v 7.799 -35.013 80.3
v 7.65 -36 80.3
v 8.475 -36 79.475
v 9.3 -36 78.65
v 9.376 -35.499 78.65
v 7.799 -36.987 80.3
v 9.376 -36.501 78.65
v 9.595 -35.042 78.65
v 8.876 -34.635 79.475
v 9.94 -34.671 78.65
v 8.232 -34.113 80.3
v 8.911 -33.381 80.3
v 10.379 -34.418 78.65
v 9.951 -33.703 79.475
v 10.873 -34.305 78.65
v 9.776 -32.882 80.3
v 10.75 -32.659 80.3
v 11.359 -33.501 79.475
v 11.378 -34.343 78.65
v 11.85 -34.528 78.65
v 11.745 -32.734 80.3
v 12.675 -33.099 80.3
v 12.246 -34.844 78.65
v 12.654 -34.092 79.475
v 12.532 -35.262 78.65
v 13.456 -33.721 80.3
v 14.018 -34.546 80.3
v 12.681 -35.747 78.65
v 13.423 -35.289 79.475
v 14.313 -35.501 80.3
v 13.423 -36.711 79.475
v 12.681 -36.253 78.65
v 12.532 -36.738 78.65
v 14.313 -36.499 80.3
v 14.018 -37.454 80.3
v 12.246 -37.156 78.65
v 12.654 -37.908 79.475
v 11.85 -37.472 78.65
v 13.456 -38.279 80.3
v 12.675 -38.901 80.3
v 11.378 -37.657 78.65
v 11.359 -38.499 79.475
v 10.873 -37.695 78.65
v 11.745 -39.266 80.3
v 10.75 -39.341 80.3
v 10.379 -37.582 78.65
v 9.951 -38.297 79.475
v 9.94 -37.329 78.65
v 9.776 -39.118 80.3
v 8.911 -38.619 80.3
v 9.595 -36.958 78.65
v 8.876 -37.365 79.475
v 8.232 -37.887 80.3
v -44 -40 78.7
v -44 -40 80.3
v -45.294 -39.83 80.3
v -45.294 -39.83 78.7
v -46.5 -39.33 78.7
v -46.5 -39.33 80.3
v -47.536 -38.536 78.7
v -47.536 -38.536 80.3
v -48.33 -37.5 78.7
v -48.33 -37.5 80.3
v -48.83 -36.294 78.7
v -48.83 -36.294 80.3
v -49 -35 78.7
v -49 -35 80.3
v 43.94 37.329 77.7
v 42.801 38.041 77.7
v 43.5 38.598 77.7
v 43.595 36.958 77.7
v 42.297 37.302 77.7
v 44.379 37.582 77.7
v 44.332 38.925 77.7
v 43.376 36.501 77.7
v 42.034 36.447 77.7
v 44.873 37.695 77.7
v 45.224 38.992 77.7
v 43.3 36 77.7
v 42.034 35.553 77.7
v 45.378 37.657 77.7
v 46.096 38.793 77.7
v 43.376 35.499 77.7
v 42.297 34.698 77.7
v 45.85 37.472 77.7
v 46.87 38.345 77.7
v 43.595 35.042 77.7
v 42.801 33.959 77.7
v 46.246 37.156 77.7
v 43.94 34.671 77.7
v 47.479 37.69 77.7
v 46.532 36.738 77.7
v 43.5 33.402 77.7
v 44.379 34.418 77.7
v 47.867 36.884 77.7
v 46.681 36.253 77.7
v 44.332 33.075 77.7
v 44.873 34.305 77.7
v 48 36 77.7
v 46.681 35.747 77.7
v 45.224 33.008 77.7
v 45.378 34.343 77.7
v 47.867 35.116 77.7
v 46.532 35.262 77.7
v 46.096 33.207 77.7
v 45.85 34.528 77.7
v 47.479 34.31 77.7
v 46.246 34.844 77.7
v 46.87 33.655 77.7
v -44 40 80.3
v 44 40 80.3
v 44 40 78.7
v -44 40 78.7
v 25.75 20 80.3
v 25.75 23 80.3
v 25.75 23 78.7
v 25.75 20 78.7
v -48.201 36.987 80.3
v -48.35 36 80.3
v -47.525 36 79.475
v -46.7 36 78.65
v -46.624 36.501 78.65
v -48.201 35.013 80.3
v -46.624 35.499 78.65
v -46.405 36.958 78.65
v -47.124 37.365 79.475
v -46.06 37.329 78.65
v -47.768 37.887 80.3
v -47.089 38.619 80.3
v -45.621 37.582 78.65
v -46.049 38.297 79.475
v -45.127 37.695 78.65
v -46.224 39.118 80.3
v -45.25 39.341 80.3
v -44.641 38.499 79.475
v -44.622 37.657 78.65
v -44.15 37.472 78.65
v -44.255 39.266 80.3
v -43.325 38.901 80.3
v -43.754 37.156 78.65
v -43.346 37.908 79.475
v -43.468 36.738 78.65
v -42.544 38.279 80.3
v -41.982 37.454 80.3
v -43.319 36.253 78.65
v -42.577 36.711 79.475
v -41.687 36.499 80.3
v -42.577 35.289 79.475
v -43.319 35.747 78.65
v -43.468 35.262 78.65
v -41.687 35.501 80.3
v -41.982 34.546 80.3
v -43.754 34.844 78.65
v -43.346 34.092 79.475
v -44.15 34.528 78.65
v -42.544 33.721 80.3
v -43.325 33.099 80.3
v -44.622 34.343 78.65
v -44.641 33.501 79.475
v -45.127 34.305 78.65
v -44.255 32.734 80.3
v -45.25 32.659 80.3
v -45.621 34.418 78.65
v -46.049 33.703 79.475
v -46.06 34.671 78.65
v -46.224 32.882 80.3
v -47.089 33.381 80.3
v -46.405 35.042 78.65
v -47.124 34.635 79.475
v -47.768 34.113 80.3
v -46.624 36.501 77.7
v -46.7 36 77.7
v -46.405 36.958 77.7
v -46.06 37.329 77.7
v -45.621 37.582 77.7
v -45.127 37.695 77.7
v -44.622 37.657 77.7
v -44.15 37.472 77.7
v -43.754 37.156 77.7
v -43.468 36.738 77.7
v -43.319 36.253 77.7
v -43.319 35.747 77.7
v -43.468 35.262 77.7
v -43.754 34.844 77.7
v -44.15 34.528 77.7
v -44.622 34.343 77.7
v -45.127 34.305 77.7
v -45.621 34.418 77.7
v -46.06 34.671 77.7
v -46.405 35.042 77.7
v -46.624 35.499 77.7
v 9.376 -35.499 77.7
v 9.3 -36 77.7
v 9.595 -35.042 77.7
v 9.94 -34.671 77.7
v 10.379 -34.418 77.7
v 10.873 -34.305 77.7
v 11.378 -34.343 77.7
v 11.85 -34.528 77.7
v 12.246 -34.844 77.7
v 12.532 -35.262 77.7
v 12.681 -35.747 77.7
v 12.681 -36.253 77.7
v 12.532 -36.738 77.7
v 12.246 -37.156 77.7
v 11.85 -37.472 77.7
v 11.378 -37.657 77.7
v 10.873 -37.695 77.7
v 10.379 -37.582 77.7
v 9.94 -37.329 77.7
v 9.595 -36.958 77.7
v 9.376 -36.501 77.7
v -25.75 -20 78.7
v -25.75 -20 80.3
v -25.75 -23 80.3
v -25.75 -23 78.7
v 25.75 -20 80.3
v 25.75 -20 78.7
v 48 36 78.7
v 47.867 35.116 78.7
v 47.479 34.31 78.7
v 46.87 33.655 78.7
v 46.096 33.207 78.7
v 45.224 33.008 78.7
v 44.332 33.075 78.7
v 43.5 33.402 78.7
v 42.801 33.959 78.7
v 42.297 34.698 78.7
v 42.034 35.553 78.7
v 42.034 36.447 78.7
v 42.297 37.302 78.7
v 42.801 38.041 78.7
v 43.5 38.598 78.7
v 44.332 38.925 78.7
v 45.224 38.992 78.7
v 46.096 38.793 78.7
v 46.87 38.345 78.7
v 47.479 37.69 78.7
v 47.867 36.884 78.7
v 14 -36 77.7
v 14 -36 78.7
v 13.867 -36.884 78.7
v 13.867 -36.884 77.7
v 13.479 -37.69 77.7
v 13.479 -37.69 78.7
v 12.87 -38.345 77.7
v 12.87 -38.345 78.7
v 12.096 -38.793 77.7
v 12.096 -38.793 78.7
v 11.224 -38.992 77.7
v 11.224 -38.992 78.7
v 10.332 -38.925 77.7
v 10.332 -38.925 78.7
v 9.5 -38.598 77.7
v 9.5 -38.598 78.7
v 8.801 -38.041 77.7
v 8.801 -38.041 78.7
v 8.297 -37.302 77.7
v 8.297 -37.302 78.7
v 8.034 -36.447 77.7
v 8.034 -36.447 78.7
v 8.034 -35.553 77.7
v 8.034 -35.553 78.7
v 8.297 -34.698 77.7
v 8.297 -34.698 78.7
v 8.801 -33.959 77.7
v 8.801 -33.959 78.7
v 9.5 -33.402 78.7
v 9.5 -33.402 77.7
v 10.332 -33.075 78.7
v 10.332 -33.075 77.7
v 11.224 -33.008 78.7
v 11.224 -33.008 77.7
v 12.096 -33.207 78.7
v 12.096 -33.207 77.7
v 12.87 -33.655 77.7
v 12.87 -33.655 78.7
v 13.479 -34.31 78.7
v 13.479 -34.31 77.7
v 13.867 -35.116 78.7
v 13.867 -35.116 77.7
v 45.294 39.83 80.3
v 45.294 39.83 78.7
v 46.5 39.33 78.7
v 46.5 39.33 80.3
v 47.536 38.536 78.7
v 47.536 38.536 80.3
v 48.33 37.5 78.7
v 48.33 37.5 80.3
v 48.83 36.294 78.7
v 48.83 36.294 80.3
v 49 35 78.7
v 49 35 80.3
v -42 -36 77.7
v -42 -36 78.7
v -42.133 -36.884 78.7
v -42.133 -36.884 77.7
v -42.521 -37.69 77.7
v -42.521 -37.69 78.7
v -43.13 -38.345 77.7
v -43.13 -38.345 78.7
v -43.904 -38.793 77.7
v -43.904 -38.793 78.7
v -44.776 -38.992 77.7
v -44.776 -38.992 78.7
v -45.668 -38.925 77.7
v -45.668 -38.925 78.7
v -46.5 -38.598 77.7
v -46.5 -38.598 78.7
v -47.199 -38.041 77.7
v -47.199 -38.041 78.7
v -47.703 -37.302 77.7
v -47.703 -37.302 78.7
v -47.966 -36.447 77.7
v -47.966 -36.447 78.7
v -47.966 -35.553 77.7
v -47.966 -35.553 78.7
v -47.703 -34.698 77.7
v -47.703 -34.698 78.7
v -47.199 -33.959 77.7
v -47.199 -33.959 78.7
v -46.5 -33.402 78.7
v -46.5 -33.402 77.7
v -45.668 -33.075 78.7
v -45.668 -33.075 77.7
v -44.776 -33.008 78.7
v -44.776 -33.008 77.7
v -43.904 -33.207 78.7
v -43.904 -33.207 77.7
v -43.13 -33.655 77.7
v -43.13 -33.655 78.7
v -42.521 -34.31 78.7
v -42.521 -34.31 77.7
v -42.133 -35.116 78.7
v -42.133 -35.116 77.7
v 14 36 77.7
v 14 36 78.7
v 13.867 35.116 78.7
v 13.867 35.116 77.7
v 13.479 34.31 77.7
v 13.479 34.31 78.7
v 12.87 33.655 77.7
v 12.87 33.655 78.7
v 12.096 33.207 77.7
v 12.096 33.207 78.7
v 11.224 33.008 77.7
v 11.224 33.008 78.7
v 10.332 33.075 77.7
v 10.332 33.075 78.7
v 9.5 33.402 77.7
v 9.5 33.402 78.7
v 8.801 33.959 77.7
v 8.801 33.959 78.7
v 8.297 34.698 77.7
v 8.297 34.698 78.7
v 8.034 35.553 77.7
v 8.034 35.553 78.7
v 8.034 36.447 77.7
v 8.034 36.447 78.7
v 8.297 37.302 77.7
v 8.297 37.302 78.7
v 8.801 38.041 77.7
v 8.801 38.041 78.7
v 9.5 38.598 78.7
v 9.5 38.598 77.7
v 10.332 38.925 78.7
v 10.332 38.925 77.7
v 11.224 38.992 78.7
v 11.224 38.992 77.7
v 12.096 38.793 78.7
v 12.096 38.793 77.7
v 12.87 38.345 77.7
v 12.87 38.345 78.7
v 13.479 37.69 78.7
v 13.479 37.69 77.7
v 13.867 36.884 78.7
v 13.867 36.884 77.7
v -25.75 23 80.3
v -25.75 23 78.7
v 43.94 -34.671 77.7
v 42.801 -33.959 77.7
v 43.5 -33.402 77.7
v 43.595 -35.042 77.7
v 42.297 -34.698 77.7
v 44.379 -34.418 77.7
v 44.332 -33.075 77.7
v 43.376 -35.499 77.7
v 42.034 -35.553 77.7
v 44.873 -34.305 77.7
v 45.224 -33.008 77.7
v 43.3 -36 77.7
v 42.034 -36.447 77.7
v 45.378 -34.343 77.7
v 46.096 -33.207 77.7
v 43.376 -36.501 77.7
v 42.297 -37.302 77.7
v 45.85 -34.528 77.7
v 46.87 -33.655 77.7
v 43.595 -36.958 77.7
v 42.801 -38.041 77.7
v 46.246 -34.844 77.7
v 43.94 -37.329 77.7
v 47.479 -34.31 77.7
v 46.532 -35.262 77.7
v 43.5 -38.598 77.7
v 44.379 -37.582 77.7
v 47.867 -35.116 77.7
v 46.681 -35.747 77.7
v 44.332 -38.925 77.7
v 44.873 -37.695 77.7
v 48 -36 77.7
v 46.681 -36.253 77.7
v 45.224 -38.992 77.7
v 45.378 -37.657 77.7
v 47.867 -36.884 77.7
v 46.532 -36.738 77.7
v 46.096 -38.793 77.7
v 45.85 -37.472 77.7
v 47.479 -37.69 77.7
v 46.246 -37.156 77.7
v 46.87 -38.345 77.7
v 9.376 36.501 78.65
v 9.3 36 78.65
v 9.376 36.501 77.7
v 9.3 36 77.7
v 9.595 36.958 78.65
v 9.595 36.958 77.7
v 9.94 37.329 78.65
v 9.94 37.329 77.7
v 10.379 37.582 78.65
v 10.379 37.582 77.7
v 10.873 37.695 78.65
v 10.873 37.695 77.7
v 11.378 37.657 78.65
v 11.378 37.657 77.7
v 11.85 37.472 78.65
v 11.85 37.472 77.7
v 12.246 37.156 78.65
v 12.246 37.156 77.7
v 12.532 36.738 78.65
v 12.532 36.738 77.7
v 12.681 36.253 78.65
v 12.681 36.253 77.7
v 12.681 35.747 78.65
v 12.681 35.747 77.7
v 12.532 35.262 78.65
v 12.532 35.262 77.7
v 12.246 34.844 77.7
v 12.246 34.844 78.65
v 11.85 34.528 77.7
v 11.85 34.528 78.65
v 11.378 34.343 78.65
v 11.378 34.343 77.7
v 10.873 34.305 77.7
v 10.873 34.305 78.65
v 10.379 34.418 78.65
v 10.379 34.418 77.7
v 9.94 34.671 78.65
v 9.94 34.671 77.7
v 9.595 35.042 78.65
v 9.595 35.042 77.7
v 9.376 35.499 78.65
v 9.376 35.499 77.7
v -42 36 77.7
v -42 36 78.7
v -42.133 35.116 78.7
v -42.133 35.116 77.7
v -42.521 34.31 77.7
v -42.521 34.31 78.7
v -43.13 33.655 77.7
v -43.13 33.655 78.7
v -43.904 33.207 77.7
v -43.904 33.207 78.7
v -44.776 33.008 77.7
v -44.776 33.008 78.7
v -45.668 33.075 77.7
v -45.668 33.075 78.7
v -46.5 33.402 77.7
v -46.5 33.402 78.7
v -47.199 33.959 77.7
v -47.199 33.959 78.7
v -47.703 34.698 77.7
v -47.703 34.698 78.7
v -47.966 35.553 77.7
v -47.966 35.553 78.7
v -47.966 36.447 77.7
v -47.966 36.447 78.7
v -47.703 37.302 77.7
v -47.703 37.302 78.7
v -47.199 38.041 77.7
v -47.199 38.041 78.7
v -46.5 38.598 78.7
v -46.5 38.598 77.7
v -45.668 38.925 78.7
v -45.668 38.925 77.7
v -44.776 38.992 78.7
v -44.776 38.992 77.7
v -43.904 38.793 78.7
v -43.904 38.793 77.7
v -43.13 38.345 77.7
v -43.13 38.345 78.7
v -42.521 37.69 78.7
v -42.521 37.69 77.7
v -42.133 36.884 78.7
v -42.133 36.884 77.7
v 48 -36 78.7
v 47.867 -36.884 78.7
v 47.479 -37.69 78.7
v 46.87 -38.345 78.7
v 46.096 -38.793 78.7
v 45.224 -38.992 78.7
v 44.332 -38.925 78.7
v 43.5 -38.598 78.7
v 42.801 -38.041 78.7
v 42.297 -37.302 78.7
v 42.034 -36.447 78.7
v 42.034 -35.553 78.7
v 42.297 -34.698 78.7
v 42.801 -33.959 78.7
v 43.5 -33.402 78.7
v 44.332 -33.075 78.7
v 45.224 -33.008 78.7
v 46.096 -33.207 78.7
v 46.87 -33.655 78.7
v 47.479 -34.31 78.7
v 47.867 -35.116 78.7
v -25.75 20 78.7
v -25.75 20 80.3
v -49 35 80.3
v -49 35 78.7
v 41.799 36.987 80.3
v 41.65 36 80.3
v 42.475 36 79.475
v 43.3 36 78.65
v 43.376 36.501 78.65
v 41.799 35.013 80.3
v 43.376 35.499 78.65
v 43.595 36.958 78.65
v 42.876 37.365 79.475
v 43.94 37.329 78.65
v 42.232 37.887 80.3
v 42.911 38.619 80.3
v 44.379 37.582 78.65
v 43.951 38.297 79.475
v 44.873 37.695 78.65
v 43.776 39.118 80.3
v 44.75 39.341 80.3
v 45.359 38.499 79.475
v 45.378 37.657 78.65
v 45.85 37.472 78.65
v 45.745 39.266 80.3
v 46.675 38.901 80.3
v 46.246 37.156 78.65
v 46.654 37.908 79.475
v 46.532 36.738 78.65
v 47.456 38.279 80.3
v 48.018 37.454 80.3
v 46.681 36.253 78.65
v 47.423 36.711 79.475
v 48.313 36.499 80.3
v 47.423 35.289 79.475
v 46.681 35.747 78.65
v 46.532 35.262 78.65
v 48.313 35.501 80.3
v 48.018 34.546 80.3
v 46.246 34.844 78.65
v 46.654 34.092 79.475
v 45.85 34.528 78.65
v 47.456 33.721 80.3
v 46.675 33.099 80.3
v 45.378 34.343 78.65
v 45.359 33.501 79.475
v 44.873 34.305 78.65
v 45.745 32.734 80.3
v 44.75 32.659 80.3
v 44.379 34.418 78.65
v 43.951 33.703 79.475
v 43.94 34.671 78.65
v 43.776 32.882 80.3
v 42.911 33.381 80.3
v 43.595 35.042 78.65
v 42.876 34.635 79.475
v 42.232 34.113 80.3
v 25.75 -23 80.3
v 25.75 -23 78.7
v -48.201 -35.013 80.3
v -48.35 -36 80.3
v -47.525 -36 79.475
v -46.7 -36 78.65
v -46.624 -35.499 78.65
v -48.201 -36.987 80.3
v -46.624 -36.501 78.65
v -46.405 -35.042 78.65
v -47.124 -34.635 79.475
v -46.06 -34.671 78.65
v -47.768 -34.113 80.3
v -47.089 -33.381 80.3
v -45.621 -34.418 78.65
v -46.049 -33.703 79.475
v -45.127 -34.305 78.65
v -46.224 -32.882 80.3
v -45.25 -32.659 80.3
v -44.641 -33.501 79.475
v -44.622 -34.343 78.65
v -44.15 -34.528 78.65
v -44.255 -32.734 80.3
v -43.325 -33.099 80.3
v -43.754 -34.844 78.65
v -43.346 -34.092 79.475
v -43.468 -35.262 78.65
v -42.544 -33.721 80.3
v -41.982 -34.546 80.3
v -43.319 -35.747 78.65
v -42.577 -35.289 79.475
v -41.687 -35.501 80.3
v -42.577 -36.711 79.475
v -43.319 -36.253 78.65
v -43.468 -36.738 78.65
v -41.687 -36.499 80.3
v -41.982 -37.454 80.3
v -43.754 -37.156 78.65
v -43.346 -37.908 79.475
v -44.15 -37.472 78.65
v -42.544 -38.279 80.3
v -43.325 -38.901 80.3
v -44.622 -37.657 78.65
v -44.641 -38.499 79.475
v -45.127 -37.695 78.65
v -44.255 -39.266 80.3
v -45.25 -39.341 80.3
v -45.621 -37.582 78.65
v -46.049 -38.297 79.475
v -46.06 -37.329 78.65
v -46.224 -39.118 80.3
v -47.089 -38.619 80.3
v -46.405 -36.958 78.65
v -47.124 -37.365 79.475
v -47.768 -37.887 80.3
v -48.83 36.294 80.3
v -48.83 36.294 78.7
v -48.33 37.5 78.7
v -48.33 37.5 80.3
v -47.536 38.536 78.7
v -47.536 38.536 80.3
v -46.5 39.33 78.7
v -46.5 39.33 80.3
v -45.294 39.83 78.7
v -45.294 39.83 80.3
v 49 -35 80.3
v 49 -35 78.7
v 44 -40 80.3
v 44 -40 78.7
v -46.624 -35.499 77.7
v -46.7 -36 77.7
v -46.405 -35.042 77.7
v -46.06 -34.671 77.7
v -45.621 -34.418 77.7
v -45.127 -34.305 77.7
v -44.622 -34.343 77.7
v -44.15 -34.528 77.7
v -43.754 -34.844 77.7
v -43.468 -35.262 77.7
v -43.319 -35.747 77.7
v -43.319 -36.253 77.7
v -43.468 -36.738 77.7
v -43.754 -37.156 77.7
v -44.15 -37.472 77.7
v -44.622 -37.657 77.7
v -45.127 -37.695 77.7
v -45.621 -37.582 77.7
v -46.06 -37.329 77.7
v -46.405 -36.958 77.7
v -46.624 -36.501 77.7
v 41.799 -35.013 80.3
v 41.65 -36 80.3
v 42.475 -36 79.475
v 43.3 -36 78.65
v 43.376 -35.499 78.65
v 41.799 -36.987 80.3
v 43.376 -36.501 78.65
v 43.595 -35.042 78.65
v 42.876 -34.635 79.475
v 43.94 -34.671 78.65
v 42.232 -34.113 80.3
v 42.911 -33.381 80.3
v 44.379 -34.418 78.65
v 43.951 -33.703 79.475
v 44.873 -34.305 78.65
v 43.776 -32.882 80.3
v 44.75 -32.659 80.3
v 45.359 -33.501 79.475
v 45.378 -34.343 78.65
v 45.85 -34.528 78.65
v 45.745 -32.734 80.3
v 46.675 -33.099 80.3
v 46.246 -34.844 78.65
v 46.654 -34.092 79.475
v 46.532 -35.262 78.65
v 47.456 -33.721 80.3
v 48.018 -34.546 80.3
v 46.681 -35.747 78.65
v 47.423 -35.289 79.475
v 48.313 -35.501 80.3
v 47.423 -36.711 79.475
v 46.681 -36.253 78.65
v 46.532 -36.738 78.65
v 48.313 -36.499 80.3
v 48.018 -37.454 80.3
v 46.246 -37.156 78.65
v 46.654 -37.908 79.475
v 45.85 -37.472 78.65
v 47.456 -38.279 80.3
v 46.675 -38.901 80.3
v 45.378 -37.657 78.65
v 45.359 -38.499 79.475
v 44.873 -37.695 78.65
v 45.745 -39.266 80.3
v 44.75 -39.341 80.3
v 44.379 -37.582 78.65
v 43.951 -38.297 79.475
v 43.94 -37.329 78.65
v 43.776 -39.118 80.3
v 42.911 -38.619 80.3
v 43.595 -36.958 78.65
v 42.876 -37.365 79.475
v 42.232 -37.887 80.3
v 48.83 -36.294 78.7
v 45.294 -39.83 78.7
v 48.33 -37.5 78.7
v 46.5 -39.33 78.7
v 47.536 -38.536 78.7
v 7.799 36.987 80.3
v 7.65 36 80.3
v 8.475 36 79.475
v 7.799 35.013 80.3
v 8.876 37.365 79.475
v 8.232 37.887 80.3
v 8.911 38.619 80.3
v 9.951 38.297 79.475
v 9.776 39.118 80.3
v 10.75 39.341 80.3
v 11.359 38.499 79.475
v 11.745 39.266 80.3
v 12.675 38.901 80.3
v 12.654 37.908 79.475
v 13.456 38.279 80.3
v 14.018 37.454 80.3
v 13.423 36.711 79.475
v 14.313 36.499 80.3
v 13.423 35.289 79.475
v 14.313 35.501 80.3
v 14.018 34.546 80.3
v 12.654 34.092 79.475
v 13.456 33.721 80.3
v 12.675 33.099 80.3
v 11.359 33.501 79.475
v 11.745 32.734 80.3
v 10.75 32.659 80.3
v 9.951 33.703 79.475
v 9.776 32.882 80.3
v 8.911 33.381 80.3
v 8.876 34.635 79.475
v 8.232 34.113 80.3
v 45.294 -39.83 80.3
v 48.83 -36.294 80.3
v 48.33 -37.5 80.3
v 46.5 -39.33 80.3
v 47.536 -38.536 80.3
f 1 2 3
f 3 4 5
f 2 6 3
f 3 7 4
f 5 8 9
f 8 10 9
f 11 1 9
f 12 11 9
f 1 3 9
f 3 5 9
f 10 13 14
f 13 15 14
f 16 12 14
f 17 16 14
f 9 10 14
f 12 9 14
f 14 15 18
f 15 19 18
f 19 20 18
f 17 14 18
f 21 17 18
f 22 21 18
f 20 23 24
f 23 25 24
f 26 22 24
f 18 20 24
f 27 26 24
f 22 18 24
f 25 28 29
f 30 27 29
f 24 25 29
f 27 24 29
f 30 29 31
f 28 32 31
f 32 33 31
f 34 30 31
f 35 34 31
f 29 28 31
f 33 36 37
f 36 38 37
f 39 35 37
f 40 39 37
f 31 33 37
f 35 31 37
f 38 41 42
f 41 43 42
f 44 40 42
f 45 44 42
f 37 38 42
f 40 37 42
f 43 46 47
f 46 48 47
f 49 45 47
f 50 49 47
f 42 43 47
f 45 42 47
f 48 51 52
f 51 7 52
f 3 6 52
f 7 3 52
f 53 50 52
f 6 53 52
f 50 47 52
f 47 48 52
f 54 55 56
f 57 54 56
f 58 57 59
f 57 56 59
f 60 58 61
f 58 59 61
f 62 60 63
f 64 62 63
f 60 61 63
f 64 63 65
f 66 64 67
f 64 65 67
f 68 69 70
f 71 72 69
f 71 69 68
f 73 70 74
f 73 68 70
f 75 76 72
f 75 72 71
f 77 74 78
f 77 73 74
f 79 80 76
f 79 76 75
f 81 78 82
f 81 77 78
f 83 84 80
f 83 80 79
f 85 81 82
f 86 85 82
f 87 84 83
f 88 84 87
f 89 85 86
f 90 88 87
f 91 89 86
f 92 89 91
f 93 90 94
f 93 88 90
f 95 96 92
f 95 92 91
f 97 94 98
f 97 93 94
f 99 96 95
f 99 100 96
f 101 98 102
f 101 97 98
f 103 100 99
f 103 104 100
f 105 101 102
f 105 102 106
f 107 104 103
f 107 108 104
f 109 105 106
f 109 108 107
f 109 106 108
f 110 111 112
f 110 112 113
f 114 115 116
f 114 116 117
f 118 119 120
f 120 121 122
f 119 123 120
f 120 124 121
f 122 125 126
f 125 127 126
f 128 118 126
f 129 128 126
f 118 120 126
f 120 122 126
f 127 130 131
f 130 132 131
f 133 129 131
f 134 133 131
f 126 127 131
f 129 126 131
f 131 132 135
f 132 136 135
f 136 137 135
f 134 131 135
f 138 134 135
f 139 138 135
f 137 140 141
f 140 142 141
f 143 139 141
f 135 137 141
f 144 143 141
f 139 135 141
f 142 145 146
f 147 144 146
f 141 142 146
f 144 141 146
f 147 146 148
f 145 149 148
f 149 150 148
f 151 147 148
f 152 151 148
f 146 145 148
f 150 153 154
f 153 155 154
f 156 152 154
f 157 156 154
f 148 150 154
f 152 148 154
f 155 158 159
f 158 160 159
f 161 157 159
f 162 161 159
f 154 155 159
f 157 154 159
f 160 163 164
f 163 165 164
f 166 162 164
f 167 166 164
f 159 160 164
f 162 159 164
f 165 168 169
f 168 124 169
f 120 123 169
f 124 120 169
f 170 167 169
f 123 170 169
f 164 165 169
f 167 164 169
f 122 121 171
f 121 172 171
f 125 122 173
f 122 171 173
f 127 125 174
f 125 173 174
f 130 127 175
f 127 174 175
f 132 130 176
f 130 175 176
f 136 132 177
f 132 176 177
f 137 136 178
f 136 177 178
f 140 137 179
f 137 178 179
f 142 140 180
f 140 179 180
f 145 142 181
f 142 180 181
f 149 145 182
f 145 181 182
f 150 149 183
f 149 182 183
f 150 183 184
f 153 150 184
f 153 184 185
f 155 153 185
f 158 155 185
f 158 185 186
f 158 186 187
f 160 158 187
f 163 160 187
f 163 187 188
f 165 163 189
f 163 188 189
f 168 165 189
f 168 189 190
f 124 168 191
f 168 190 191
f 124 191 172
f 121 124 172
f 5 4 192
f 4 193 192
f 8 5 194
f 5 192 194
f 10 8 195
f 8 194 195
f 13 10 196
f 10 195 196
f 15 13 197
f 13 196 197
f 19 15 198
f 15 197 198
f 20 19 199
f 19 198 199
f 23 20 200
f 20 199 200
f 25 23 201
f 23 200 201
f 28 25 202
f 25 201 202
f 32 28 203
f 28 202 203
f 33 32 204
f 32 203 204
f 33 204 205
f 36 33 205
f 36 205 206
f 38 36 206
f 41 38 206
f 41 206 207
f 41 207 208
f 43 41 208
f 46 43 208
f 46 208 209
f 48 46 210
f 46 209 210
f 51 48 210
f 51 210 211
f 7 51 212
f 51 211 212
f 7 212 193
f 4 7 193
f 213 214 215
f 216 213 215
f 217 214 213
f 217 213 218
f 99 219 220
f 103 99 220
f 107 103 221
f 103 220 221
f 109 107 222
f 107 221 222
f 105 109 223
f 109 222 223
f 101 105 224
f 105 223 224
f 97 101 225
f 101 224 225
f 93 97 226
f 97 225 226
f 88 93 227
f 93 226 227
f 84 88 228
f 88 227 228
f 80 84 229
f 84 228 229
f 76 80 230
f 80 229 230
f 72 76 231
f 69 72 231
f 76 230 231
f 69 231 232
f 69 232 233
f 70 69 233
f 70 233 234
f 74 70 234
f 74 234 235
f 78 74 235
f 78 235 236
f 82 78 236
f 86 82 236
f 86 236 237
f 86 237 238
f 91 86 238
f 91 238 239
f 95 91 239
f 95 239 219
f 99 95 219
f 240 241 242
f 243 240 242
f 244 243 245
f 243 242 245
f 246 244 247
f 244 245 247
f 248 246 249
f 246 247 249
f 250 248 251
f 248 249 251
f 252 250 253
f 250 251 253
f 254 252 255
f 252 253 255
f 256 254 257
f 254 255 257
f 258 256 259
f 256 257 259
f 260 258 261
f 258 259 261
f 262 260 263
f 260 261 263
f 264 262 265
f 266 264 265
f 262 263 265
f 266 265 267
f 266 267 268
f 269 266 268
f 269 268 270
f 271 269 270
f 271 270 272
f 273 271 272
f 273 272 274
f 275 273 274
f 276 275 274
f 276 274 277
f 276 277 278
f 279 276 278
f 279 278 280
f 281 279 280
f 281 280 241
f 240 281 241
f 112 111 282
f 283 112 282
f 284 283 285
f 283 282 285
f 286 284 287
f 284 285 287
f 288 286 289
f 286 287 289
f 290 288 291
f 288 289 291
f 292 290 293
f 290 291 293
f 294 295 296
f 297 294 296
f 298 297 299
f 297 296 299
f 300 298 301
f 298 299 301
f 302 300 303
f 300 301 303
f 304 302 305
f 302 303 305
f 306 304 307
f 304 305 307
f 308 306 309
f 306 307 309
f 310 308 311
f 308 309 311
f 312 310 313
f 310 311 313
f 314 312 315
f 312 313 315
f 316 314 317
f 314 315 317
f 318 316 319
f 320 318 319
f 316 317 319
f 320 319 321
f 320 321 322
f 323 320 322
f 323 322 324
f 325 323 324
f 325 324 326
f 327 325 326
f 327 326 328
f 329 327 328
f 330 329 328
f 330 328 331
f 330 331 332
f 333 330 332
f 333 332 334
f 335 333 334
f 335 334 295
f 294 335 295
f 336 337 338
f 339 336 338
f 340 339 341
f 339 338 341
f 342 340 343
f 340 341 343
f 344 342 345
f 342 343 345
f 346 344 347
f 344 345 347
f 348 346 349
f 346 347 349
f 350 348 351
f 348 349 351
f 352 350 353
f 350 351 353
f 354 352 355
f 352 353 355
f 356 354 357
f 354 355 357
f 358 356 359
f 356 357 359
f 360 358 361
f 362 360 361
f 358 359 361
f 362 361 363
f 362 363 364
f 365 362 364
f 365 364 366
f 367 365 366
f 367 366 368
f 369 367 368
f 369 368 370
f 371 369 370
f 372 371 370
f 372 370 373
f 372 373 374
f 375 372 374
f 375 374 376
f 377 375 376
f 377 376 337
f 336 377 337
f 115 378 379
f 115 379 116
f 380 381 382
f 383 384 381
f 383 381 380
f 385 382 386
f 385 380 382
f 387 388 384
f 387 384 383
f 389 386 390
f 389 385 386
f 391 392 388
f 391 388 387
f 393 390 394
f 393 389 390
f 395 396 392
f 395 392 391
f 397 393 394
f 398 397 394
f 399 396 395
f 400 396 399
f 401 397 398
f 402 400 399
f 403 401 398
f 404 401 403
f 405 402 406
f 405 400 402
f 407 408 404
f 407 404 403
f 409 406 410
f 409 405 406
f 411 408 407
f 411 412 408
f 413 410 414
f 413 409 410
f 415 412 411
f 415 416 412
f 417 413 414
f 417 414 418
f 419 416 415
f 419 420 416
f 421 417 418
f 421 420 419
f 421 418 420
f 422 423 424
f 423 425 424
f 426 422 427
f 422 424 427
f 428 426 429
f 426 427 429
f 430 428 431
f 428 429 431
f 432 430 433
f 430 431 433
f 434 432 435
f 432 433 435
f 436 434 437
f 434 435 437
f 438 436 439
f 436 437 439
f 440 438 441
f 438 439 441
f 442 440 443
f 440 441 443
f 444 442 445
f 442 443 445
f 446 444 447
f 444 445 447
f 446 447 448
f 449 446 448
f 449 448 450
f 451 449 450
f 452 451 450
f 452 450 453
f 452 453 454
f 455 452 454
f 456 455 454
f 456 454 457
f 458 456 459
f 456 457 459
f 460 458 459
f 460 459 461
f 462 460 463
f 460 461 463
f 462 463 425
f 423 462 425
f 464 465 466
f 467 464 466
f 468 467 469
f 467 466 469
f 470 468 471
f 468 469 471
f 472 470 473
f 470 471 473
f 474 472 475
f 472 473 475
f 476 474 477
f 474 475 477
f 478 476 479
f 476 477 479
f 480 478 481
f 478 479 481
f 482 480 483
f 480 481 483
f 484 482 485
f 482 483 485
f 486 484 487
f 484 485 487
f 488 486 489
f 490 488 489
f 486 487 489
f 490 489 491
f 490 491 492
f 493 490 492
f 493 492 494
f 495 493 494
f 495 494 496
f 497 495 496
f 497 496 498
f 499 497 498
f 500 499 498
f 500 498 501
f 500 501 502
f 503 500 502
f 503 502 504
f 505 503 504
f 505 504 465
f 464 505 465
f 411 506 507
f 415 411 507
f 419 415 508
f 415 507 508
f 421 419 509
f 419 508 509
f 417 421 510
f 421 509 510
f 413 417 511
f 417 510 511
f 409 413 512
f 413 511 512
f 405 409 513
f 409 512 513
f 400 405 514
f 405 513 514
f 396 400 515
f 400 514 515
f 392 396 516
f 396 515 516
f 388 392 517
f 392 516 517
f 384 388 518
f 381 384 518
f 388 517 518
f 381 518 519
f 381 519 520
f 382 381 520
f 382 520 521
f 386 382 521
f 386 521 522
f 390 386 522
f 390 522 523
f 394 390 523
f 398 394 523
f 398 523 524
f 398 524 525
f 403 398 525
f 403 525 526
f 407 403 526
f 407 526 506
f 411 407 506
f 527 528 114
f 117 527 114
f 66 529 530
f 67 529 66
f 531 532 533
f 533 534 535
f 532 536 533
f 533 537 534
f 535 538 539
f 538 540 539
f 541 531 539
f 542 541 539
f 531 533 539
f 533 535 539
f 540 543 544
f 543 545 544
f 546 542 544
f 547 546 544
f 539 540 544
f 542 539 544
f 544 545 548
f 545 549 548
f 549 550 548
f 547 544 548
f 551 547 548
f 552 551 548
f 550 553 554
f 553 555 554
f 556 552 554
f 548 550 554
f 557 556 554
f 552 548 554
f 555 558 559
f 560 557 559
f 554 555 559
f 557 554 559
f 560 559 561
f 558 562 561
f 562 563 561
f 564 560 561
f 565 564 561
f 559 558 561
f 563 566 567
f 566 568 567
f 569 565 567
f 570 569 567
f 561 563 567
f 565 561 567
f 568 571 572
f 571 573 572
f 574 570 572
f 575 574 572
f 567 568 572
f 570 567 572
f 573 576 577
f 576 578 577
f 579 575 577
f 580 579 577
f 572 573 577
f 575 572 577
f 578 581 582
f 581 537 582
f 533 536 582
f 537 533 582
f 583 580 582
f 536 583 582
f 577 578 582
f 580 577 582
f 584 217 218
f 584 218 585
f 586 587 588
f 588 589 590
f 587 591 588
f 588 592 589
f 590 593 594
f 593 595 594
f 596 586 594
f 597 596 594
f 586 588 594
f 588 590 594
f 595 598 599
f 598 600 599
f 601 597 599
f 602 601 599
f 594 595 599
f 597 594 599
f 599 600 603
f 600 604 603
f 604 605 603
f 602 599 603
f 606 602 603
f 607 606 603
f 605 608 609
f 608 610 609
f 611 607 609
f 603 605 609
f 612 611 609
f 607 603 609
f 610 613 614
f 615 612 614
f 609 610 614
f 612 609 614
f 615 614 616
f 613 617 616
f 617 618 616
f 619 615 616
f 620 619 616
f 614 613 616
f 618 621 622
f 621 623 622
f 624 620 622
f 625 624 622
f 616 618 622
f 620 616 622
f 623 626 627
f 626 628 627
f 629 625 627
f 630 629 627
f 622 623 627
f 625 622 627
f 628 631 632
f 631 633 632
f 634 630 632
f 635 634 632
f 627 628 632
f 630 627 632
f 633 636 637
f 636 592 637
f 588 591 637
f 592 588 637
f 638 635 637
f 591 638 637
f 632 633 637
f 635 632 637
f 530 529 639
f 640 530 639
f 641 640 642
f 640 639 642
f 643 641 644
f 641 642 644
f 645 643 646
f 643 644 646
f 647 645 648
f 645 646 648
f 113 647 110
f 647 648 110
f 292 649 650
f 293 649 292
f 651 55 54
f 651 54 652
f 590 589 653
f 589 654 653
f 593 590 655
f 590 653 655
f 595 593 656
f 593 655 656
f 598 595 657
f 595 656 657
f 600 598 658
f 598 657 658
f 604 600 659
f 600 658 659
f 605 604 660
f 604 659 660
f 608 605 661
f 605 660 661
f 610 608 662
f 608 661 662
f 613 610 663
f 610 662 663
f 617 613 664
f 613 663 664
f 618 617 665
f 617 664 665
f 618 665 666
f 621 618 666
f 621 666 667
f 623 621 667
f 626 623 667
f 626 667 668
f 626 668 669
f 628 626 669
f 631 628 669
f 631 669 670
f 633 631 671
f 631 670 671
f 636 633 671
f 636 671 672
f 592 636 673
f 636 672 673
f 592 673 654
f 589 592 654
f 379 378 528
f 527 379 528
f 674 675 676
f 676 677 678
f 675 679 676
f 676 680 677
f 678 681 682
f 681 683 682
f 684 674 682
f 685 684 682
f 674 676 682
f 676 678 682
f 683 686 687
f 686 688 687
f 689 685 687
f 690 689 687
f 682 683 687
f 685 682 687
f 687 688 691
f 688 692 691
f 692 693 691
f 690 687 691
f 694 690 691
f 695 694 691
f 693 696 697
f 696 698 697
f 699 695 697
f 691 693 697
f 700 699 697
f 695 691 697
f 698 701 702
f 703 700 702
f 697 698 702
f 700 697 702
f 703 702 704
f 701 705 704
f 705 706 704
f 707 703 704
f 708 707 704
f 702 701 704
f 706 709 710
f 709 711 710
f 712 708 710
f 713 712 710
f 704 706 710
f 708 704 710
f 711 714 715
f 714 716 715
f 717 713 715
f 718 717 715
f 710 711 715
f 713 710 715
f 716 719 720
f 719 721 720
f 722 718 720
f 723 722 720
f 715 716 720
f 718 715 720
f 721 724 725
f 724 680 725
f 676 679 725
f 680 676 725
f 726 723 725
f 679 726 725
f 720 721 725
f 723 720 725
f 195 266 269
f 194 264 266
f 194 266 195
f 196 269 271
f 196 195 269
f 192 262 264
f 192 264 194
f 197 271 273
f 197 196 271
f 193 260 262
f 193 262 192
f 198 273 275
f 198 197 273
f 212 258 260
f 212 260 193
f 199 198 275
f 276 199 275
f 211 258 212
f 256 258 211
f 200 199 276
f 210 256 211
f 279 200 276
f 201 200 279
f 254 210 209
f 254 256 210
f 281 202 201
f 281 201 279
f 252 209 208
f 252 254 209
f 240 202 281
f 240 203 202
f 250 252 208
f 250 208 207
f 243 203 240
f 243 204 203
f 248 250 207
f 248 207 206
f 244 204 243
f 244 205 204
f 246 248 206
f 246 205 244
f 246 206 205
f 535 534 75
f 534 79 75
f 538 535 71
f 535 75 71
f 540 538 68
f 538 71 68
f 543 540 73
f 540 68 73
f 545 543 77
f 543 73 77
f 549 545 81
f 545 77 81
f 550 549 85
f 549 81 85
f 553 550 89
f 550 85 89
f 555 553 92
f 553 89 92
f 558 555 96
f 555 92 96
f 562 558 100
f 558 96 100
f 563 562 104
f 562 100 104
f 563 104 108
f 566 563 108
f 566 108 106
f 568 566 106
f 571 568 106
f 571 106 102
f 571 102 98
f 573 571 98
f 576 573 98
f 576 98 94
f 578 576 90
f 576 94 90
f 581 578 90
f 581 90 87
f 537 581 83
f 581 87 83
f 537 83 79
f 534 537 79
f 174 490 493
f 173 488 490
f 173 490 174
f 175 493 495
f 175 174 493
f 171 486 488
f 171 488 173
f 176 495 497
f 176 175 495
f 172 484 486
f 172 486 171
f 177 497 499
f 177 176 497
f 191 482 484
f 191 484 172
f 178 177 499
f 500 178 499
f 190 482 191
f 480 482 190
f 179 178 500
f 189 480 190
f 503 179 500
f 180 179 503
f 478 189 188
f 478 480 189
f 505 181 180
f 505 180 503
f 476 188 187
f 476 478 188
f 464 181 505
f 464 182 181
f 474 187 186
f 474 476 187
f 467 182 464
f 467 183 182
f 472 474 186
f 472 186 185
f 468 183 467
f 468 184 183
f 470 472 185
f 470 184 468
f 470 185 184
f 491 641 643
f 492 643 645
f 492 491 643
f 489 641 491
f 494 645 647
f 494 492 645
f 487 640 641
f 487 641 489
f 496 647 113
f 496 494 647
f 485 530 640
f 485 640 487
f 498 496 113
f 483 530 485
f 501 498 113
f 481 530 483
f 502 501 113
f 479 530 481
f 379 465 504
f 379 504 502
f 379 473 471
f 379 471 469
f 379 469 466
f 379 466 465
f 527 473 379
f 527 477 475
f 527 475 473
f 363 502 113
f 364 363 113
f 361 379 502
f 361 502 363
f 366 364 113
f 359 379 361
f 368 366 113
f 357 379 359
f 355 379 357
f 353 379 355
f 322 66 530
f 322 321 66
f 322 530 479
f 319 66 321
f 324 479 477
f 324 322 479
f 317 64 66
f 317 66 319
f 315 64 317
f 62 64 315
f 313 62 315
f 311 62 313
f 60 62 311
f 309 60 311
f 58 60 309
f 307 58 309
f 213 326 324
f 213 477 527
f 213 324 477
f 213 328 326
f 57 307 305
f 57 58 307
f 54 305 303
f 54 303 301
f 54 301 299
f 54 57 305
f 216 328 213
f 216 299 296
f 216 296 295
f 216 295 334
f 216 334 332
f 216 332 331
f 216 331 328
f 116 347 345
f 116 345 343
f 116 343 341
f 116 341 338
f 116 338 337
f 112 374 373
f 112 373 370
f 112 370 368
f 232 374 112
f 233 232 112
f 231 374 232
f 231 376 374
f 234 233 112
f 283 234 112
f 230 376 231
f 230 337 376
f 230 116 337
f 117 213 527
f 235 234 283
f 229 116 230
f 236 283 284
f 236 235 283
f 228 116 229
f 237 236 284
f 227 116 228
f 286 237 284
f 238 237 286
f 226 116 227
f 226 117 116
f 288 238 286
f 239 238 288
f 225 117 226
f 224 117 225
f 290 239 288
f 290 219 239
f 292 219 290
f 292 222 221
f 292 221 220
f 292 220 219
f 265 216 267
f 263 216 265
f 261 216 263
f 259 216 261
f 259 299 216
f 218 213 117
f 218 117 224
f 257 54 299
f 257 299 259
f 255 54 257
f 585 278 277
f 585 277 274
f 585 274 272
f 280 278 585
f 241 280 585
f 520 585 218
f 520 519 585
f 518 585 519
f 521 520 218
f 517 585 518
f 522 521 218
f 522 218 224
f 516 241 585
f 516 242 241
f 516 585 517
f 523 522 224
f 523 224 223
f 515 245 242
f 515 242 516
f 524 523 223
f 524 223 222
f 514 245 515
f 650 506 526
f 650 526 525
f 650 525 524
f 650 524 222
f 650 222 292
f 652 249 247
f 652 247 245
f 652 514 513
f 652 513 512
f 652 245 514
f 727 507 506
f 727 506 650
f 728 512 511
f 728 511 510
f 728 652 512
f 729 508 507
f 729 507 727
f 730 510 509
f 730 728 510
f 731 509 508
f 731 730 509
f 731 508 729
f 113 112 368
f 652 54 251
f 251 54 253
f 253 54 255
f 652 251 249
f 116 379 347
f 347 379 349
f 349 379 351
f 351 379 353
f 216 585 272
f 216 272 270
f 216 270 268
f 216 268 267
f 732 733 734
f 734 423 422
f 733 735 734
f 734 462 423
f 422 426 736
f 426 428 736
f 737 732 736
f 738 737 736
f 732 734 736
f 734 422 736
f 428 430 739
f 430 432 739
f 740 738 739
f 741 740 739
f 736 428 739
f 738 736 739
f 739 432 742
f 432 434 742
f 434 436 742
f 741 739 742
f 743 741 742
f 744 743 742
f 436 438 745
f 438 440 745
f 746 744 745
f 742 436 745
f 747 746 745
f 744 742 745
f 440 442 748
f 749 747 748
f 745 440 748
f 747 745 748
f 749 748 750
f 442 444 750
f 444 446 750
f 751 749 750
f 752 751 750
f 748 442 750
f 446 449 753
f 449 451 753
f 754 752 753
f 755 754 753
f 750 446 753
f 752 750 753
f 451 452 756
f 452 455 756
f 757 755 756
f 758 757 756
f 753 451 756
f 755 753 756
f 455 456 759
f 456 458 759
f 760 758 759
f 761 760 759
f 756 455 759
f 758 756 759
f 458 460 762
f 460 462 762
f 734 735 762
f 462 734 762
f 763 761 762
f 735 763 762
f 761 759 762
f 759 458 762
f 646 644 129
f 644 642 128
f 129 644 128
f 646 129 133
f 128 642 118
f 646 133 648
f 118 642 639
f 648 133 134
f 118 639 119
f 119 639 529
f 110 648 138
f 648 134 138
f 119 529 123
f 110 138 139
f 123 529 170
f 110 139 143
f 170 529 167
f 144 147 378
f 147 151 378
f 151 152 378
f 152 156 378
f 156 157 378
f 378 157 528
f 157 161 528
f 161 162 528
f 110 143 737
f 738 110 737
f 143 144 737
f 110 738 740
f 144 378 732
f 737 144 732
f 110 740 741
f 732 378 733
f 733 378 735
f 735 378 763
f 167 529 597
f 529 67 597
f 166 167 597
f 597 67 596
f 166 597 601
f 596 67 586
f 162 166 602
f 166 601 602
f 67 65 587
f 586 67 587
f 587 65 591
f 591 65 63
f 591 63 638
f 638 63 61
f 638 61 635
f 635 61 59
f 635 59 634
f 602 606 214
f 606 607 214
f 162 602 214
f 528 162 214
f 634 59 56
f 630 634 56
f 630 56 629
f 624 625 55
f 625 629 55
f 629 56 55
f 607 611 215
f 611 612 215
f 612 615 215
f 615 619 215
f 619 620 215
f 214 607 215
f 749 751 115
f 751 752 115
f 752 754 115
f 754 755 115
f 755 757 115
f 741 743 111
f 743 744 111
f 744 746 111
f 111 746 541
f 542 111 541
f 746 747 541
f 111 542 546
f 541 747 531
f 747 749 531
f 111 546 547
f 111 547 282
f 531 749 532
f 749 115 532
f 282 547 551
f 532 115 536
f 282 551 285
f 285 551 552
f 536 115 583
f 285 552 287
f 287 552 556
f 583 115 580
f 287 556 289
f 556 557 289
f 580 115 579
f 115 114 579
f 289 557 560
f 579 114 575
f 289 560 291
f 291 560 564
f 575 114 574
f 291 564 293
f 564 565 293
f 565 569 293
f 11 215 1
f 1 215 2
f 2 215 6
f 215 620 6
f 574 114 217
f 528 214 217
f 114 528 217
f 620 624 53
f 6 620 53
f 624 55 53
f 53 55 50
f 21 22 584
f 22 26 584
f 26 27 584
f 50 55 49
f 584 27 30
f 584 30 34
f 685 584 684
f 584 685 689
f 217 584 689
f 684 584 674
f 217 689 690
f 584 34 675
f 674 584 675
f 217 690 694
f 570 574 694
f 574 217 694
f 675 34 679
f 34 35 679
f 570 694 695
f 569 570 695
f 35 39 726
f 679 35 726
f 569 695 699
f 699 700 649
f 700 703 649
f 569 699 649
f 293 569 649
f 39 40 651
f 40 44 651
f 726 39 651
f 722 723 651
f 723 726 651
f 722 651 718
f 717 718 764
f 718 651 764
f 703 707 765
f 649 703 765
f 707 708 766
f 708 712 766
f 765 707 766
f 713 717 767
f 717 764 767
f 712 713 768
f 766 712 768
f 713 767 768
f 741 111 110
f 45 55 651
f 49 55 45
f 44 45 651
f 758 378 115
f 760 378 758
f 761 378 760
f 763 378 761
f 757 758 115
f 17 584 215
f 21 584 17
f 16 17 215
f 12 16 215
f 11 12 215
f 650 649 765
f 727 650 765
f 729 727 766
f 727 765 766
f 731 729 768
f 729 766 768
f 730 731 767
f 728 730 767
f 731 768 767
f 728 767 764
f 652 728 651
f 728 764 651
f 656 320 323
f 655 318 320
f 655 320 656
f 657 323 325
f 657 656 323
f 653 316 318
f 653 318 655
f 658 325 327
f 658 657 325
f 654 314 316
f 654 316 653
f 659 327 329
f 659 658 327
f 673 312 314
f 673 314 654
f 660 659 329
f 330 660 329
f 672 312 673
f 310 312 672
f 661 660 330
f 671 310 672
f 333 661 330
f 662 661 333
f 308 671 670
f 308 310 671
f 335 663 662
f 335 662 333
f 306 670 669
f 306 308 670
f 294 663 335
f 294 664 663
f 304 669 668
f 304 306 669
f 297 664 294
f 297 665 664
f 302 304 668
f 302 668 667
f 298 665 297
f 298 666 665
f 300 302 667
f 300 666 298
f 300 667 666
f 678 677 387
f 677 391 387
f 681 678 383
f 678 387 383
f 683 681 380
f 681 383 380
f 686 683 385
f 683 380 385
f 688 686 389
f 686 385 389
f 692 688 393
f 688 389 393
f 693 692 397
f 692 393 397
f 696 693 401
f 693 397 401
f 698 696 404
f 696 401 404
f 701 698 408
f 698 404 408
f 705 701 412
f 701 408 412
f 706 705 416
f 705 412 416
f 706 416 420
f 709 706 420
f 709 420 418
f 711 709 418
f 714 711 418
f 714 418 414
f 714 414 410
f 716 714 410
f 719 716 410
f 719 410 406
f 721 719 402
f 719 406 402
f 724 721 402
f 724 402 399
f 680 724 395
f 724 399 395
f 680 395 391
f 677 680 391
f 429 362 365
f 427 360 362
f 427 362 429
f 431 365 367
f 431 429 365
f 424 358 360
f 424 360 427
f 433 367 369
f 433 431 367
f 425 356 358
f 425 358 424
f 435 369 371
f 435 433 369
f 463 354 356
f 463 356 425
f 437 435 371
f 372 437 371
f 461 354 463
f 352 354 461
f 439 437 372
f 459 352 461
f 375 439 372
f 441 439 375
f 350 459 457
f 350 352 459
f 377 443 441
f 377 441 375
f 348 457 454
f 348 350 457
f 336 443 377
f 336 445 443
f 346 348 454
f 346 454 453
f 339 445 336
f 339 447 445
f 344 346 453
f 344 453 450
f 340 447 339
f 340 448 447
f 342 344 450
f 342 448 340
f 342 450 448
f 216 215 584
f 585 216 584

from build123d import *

# Parameters (mm, degrees)
SKETCH021_W             = 51.5
SKETCH021_H             = 3
PAD014_DEPTH            = 1.6
SKETCH022_R             = 3
PAD015_DEPTH            = 2.6
HOLE_D                  = 3.4
HOLE_DEPTH              = 25
HOLE_CSINK_D            = 6.7
HOLE_CSINK_ANGLE        = 90
BODY005_PLACEMENT_ANGLE = 180


with BuildPart() as part:
    # Sketch021 → Pad014 (new body)
    with BuildSketch(Plane.XY):
        with BuildLine():
            ThreePointArc((-44, 40), (-47.535534, 38.535534), (-49, 35))
            Line((-49, -35), (-49, 35))
            ThreePointArc((-49, -35), (-47.535534, -38.535534), (-44, -40))
            Line((44, -40), (-44, -40))
            ThreePointArc((44, -40), (47.535534, -38.535534), (49, -35))
            Line((49, 35), (49, -35))
            ThreePointArc((49, 35), (47.535534, 38.535534), (44, 40))
            Line((-44, 40), (44, 40))
        make_face()
        with Locations((0, 21.5)):
            Rectangle(SKETCH021_W, SKETCH021_H, mode=Mode.SUBTRACT)
        with Locations((0, -21.5)):
            Rectangle(SKETCH021_W, SKETCH021_H, mode=Mode.SUBTRACT)
    extrude(amount=PAD014_DEPTH)

    # Sketch022 → Pad015 (join)
    with BuildSketch(Plane.XY):
        with Locations((-45, 36)):
            Circle(SKETCH022_R)
        with Locations((11, 36)):
            Circle(SKETCH022_R)
        with Locations((45, 36)):
            Circle(SKETCH022_R)
        with Locations((45, -36)):
            Circle(SKETCH022_R)
        with Locations((11, -36)):
            Circle(SKETCH022_R)
        with Locations((-45, -36)):
            Circle(SKETCH022_R)
    extrude(amount=PAD015_DEPTH)

    # Hole
    with Locations(Plane(origin=(0, 0, 0), x_dir=(1, 0, 0), z_dir=(0, 0, -1))):
        with Locations((-45, -36), (11, -36), (45, -36), (45, 36), (11, 36), (-45, 36)):
            CounterSinkHole(HOLE_D / 2, HOLE_CSINK_D / 2, depth=HOLE_DEPTH, counter_sink_angle=HOLE_CSINK_ANGLE)


with BuildPart() as part_1:
    # Body005 placement: moved
    add(part.part.moved(Location((0, 0, 80.3))).rotate(Axis((0, 0, 80.3), (1, 0, 0)), BODY005_PLACEMENT_ANGLE))


solid = part_1.part
